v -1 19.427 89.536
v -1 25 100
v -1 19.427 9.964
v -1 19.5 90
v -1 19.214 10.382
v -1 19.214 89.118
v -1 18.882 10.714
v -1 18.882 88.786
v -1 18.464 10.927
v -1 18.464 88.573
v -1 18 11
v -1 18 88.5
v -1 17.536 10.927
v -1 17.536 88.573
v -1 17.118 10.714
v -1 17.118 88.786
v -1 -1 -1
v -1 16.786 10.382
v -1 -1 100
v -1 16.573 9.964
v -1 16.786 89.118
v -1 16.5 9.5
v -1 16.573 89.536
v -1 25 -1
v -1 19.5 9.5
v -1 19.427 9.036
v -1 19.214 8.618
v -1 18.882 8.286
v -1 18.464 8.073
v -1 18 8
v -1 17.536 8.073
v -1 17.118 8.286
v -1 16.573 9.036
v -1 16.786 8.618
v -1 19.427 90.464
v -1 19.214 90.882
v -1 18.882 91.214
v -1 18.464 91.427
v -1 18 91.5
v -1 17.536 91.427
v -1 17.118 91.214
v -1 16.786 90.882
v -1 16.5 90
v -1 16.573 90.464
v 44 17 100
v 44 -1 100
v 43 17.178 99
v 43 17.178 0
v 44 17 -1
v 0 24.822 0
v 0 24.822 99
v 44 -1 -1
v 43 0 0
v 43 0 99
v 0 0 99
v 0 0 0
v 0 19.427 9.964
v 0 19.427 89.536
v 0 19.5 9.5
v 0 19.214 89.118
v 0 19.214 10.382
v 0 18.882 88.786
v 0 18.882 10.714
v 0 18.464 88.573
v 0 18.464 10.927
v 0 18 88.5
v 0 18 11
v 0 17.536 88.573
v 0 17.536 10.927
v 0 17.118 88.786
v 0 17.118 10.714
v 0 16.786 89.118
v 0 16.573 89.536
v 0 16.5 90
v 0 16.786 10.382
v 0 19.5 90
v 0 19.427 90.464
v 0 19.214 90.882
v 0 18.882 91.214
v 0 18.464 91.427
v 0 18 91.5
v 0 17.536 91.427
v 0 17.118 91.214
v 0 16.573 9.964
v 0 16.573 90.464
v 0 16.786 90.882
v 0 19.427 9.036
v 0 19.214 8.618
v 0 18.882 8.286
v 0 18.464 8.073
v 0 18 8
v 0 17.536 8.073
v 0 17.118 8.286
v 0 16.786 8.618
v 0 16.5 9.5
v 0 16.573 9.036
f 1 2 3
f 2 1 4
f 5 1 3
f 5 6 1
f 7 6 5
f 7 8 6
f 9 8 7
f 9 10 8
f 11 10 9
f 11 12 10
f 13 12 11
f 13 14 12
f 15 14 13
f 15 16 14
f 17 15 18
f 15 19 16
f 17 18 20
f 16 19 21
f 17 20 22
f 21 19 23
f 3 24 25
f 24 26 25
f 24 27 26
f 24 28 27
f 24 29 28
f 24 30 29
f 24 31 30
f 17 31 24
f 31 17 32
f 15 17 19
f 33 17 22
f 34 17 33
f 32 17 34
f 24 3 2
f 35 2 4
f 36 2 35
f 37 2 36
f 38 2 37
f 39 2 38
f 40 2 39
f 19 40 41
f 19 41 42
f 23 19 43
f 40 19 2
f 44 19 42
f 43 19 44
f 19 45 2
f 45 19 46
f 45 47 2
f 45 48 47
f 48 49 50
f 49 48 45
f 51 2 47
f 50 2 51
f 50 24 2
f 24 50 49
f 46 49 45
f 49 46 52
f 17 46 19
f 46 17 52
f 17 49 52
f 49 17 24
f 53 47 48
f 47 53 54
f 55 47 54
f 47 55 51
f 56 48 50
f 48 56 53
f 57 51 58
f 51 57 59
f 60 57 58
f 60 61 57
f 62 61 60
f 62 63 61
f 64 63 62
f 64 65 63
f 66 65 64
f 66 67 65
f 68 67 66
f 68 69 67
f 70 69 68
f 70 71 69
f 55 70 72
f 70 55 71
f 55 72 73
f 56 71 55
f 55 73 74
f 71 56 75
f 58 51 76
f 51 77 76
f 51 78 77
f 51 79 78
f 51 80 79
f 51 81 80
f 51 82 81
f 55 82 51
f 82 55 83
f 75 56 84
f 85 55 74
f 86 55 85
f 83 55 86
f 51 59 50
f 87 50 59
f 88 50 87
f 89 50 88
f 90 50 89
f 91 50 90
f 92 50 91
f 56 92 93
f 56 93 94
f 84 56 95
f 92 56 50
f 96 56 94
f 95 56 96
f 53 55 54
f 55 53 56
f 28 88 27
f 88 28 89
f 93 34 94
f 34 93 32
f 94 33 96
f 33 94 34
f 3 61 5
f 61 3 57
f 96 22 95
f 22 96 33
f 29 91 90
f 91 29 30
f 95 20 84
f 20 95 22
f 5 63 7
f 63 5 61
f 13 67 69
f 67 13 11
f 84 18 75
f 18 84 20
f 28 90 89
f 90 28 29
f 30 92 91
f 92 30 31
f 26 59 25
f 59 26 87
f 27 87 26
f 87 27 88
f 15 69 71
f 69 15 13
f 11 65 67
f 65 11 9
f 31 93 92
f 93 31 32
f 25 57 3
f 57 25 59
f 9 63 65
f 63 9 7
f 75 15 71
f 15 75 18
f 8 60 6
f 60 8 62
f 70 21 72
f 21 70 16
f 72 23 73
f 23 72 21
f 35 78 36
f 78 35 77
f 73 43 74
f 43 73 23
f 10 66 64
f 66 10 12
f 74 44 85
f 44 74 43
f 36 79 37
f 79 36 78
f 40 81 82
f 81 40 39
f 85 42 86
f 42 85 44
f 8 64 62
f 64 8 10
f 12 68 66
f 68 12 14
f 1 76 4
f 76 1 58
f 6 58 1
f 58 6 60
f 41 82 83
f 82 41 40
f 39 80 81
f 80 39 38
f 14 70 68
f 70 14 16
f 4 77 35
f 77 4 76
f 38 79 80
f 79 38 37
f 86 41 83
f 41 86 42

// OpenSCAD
$fn=20;


/*linear_extrude(height=0.2) difference() {
    hull() {
        circle(d=3+2);
        translate([0, 80]) circle(d=3+2);
    }

    circle(d=3);
    translate([0, 80]) circle(d=3);
}*/


thickness=1.0;

length=43;
width=25;
height=99;

//16
difference() {
    translate([0, 0, -thickness]) linear_extrude(height=height+thickness*2) polygon([
        [-thickness, -thickness],
        [-thickness, width], 
        [length+thickness, 43-50/2-1],
        [length+thickness, -thickness]
    ]);
    cube([length, width, height]);
    translate([-thickness, 16+2, (height-80)/2]) rotate([0, 90, 0]) cylinder(d=3, h=10);
    translate([-thickness, 16+2, height-(98-80)/2]) rotate([0, 90, 0]) cylinder(d=3, h=10);
    translate([43, 43, height-36]) rotate([0, 90, 0]) cylinder(d=50, h=10);
}
